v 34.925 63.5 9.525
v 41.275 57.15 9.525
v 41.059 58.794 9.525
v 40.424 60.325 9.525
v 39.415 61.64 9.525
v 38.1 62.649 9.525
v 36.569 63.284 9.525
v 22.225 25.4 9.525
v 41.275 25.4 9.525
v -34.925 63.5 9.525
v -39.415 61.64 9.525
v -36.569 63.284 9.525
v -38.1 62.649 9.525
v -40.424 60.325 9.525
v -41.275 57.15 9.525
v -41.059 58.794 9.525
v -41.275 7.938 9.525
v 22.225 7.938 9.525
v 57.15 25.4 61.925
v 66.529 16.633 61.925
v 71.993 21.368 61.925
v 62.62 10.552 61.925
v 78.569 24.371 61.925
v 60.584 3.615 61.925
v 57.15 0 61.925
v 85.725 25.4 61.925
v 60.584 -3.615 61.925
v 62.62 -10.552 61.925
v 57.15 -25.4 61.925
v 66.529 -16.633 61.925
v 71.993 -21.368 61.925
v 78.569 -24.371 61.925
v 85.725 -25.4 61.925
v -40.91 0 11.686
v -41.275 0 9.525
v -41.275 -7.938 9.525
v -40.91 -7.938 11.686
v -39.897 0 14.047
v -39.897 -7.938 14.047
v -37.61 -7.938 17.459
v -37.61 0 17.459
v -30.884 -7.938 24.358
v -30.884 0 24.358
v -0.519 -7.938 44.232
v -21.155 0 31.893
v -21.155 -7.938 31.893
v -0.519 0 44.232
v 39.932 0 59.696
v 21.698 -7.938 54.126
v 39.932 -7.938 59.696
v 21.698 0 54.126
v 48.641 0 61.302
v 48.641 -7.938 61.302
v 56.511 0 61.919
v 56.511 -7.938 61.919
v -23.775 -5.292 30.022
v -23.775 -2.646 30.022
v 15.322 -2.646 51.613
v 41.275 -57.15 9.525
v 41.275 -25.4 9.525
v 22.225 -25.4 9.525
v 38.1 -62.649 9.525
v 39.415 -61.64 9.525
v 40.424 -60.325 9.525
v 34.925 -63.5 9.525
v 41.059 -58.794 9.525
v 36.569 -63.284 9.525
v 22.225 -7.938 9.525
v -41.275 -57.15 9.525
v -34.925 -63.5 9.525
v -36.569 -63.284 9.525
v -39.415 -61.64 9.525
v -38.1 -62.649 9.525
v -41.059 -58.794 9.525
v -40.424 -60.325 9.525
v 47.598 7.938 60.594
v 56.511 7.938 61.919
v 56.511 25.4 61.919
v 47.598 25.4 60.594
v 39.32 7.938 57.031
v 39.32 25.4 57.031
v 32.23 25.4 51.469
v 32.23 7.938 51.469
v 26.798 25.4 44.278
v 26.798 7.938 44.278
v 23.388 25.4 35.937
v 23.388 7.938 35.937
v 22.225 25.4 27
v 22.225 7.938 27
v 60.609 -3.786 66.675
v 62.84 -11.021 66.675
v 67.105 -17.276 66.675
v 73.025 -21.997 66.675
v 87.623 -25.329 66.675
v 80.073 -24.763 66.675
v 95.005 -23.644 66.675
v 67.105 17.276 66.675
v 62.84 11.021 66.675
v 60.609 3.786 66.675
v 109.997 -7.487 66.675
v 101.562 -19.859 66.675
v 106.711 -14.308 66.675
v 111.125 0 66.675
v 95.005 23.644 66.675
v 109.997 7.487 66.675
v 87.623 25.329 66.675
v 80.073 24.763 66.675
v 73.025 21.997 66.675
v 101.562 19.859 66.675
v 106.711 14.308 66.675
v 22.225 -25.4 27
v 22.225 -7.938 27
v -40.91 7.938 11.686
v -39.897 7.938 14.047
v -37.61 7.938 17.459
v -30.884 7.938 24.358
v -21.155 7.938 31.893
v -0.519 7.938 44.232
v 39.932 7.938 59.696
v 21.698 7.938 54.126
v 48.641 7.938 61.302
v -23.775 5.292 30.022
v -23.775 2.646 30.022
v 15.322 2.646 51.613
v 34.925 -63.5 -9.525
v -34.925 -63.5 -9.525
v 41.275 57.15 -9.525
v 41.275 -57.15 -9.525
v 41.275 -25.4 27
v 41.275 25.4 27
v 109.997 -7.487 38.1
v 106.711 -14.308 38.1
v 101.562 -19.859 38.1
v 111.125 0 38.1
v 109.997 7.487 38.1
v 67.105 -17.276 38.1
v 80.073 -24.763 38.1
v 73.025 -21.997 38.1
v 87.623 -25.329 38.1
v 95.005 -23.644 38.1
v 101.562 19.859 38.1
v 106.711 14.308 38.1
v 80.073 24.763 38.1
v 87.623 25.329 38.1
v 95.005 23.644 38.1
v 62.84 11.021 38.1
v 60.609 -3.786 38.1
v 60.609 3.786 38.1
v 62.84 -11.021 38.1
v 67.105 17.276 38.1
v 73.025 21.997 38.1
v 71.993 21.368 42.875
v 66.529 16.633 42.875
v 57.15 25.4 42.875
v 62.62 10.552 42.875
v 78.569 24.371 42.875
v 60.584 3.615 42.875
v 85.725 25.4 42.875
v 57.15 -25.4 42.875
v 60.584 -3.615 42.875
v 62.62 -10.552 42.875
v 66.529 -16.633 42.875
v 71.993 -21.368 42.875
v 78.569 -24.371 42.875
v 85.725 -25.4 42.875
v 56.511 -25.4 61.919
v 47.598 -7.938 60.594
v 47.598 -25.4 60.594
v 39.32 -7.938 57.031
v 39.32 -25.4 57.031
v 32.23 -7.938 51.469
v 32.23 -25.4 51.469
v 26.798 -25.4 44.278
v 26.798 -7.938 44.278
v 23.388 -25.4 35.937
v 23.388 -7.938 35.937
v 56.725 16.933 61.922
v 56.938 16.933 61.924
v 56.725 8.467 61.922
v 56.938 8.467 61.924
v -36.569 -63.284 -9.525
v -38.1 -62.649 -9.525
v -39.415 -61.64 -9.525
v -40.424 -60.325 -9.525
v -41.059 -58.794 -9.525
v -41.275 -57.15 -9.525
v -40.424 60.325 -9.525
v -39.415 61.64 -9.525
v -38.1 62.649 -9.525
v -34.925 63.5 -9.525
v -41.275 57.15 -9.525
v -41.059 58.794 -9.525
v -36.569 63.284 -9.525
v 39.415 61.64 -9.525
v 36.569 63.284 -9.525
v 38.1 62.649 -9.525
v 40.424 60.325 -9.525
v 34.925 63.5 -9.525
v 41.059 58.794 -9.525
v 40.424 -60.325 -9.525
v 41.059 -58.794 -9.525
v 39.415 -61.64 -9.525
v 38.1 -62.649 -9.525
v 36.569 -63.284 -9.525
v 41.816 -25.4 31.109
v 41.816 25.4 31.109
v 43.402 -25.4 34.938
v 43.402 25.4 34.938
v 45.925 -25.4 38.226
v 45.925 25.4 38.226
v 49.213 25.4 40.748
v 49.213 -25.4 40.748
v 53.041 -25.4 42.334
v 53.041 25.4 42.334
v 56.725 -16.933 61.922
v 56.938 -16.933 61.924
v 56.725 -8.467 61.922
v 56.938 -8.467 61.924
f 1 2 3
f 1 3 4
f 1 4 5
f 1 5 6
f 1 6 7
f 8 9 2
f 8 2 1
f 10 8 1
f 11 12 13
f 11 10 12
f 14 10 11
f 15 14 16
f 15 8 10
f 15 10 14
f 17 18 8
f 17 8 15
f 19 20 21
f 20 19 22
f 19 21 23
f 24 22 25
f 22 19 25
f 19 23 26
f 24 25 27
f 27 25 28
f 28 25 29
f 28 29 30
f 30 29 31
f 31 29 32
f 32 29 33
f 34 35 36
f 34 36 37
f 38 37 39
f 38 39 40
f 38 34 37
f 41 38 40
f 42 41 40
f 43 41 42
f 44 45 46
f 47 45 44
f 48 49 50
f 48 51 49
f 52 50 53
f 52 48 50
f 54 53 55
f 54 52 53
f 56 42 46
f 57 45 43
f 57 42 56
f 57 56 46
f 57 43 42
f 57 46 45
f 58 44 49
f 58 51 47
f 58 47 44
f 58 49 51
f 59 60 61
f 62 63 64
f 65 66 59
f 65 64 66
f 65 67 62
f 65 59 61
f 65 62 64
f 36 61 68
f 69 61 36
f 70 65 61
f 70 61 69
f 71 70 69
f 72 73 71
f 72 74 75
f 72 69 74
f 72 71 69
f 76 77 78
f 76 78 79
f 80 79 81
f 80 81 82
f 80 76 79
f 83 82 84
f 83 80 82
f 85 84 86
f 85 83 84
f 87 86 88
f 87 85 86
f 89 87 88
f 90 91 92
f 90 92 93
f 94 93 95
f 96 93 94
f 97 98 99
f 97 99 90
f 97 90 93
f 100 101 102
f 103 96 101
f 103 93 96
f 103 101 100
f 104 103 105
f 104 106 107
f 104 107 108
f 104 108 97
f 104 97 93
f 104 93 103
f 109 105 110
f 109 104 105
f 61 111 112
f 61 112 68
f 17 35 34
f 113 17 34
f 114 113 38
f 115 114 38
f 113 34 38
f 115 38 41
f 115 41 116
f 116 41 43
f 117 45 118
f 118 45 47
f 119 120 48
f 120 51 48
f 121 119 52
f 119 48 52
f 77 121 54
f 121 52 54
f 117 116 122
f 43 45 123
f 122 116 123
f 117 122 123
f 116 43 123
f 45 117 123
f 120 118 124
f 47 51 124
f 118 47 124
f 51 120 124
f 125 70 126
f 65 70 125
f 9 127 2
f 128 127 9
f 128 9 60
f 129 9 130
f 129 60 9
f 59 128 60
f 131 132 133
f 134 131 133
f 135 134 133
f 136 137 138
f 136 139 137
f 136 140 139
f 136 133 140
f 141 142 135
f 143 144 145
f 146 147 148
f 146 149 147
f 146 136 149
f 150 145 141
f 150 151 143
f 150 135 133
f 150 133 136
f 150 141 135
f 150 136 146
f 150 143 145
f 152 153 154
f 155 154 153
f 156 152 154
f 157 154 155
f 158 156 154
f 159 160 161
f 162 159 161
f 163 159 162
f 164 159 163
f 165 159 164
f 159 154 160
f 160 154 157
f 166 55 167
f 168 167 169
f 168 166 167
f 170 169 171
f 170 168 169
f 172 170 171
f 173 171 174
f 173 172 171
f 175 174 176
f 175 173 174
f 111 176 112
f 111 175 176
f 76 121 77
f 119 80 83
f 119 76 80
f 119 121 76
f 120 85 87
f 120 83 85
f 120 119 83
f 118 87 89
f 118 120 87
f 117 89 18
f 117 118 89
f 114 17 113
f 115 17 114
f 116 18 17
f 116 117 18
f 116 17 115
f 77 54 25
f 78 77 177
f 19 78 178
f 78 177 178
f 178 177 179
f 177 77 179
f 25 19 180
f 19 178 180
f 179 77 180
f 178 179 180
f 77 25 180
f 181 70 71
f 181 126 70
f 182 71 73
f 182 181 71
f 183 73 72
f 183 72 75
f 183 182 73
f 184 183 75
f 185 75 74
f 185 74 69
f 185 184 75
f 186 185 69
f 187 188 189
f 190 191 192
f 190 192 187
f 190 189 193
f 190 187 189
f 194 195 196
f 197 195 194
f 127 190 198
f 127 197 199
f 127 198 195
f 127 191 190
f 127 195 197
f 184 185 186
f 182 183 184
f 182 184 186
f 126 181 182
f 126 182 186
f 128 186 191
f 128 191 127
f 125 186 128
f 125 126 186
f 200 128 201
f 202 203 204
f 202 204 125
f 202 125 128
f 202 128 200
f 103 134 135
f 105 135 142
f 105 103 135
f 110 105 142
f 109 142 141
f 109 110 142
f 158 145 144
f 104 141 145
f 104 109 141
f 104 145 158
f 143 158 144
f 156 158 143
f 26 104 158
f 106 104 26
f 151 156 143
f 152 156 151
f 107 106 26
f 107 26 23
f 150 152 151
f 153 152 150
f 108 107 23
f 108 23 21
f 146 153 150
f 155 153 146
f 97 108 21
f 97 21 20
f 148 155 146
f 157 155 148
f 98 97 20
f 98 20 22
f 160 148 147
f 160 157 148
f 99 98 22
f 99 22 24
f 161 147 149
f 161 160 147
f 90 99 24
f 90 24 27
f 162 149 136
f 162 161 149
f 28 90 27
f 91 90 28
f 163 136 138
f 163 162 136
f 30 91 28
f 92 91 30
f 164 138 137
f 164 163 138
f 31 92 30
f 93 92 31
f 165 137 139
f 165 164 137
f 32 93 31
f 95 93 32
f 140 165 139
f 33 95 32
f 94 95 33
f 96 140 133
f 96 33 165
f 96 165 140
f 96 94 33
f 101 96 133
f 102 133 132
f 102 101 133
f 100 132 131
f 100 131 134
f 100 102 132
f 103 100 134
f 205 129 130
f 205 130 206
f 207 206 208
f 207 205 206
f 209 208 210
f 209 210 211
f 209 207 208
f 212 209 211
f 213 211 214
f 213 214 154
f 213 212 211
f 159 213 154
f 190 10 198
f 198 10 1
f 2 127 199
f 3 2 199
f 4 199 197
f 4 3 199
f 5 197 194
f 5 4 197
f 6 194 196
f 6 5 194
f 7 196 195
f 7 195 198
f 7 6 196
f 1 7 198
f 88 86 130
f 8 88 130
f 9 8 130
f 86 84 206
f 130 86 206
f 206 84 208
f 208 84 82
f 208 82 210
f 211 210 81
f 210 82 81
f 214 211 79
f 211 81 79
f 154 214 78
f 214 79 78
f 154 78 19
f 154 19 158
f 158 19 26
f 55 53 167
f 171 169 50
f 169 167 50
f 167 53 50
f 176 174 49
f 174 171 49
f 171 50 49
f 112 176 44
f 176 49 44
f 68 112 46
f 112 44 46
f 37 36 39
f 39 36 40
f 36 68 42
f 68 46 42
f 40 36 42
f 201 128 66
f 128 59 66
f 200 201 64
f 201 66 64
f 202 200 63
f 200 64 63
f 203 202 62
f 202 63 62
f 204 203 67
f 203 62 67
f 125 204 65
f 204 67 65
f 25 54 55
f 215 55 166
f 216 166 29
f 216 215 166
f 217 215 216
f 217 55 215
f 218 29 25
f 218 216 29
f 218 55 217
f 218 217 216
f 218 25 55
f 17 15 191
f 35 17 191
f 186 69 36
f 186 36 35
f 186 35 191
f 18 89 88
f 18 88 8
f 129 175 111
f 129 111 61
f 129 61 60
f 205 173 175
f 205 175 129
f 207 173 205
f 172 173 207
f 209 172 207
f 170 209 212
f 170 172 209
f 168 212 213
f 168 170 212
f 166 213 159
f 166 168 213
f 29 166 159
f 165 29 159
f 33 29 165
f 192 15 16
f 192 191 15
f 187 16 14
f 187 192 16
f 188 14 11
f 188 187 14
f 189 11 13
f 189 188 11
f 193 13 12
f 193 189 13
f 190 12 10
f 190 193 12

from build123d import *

# Parameters (mm, degrees)
F1_DEPTH = 63.5
F2_DEPTH = 25.4
F0_W     = 25.4
F0_H     = 19.05
F3_DEPTH = 25.4
F4_DEPTH = 7.9375
F6_R     = 6.35


with BuildPart() as f1:
    # F0 (on Front) → F1 (new body, symmetric)
    with BuildSketch(Plane.XZ):
        Polygon((22.225, 9.525), (-41.275, 9.525), (-41.275, -9.525), (41.275, -9.525), (41.275, 9.525), align=None)
    extrude(amount=F1_DEPTH, both=True)

    # F0 (on Front) → F2 (join, symmetric)
    with BuildSketch(Plane.XZ):
        with BuildLine():
            Line((22.225, 27.0002), (22.225, 9.525))
            Line((22.225, 9.525), (41.275, 9.525))
            Line((41.275, 9.525), (41.275, 27.0002))
            ThreePointArc((41.275, 27.0002), (45.9246798487, 38.2255201513), (57.15, 42.8752))
            Line((57.15, 42.8752), (60.325, 42.8752))
            Line((60.325, 42.8752), (60.325, 61.9252))
            Line((60.325, 61.9252), (57.15, 61.9252))
            add(Edge.make_bspline(
                [(56.5114887891, 61.9193627682), (56.7252668459, 61.9225827874), (56.9381101801, 61.9245325067), (57.15, 61.9252)],
                knots=[110.8414409639, 110.8414409639, 110.8414409639, 110.8414409639, 111.5045361635, 111.5045361635, 111.5045361635, 111.5045361635], degree=3))
            ThreePointArc((56.5114887891, 61.9193627682), (32.2295703384, 51.469115188), (22.225, 27.0002))
        make_face()
    extrude(amount=F2_DEPTH, both=True)

    # F0 (on Front) → F3 (join, symmetric)
    with BuildSketch(Plane.XZ):
        with Locations((73.025, 52.4002)):
            Rectangle(F0_W, F0_H)
    extrude(amount=F3_DEPTH, both=True)

    # F0 (on Front) → F4 (join, symmetric)
    with BuildSketch(Plane.XZ):
        with BuildLine():
            add(Edge.make_bspline(
                [(-41.275, 9.525), (-41.0755103707, 25.3485469245), (20.7768493641, 61.3811119099), (56.5114887891, 61.9193627682)],
                knots=[0, 0, 0, 0, 110.8414409639, 110.8414409639, 110.8414409639, 110.8414409639], degree=3))
            Line((-41.275, 9.525), (22.225, 9.525))
            Line((22.225, 9.525), (22.225, 27.0002))
            ThreePointArc((22.225, 27.0002), (32.2295703384, 51.469115188), (56.5114887891, 61.9193627682))
        make_face()
    extrude(amount=F4_DEPTH, both=True)

    # F0 (on Front) → F5 (revolve)
    with BuildSketch(Plane.XZ):
        Polygon((85.725, 66.675), (85.725, 61.9252), (85.725, 42.8752), (85.725, 38.1), (111.125, 38.1), (111.125, 66.675), align=None)
    revolve(axis=Axis((85.725, 0, 52.3875), (0, 0, 1)))

    # F6
    f6_edges = [f1.edges().sort_by_distance(p)[0] for p in [
        (-41.275, -63.5, 0),
        (41.275, -63.5, 0),
        (41.275, 63.5, 0),
        (-41.275, 63.5, 0),
    ]]
    fillet(f6_edges, radius=F6_R)


solid = f1.part
